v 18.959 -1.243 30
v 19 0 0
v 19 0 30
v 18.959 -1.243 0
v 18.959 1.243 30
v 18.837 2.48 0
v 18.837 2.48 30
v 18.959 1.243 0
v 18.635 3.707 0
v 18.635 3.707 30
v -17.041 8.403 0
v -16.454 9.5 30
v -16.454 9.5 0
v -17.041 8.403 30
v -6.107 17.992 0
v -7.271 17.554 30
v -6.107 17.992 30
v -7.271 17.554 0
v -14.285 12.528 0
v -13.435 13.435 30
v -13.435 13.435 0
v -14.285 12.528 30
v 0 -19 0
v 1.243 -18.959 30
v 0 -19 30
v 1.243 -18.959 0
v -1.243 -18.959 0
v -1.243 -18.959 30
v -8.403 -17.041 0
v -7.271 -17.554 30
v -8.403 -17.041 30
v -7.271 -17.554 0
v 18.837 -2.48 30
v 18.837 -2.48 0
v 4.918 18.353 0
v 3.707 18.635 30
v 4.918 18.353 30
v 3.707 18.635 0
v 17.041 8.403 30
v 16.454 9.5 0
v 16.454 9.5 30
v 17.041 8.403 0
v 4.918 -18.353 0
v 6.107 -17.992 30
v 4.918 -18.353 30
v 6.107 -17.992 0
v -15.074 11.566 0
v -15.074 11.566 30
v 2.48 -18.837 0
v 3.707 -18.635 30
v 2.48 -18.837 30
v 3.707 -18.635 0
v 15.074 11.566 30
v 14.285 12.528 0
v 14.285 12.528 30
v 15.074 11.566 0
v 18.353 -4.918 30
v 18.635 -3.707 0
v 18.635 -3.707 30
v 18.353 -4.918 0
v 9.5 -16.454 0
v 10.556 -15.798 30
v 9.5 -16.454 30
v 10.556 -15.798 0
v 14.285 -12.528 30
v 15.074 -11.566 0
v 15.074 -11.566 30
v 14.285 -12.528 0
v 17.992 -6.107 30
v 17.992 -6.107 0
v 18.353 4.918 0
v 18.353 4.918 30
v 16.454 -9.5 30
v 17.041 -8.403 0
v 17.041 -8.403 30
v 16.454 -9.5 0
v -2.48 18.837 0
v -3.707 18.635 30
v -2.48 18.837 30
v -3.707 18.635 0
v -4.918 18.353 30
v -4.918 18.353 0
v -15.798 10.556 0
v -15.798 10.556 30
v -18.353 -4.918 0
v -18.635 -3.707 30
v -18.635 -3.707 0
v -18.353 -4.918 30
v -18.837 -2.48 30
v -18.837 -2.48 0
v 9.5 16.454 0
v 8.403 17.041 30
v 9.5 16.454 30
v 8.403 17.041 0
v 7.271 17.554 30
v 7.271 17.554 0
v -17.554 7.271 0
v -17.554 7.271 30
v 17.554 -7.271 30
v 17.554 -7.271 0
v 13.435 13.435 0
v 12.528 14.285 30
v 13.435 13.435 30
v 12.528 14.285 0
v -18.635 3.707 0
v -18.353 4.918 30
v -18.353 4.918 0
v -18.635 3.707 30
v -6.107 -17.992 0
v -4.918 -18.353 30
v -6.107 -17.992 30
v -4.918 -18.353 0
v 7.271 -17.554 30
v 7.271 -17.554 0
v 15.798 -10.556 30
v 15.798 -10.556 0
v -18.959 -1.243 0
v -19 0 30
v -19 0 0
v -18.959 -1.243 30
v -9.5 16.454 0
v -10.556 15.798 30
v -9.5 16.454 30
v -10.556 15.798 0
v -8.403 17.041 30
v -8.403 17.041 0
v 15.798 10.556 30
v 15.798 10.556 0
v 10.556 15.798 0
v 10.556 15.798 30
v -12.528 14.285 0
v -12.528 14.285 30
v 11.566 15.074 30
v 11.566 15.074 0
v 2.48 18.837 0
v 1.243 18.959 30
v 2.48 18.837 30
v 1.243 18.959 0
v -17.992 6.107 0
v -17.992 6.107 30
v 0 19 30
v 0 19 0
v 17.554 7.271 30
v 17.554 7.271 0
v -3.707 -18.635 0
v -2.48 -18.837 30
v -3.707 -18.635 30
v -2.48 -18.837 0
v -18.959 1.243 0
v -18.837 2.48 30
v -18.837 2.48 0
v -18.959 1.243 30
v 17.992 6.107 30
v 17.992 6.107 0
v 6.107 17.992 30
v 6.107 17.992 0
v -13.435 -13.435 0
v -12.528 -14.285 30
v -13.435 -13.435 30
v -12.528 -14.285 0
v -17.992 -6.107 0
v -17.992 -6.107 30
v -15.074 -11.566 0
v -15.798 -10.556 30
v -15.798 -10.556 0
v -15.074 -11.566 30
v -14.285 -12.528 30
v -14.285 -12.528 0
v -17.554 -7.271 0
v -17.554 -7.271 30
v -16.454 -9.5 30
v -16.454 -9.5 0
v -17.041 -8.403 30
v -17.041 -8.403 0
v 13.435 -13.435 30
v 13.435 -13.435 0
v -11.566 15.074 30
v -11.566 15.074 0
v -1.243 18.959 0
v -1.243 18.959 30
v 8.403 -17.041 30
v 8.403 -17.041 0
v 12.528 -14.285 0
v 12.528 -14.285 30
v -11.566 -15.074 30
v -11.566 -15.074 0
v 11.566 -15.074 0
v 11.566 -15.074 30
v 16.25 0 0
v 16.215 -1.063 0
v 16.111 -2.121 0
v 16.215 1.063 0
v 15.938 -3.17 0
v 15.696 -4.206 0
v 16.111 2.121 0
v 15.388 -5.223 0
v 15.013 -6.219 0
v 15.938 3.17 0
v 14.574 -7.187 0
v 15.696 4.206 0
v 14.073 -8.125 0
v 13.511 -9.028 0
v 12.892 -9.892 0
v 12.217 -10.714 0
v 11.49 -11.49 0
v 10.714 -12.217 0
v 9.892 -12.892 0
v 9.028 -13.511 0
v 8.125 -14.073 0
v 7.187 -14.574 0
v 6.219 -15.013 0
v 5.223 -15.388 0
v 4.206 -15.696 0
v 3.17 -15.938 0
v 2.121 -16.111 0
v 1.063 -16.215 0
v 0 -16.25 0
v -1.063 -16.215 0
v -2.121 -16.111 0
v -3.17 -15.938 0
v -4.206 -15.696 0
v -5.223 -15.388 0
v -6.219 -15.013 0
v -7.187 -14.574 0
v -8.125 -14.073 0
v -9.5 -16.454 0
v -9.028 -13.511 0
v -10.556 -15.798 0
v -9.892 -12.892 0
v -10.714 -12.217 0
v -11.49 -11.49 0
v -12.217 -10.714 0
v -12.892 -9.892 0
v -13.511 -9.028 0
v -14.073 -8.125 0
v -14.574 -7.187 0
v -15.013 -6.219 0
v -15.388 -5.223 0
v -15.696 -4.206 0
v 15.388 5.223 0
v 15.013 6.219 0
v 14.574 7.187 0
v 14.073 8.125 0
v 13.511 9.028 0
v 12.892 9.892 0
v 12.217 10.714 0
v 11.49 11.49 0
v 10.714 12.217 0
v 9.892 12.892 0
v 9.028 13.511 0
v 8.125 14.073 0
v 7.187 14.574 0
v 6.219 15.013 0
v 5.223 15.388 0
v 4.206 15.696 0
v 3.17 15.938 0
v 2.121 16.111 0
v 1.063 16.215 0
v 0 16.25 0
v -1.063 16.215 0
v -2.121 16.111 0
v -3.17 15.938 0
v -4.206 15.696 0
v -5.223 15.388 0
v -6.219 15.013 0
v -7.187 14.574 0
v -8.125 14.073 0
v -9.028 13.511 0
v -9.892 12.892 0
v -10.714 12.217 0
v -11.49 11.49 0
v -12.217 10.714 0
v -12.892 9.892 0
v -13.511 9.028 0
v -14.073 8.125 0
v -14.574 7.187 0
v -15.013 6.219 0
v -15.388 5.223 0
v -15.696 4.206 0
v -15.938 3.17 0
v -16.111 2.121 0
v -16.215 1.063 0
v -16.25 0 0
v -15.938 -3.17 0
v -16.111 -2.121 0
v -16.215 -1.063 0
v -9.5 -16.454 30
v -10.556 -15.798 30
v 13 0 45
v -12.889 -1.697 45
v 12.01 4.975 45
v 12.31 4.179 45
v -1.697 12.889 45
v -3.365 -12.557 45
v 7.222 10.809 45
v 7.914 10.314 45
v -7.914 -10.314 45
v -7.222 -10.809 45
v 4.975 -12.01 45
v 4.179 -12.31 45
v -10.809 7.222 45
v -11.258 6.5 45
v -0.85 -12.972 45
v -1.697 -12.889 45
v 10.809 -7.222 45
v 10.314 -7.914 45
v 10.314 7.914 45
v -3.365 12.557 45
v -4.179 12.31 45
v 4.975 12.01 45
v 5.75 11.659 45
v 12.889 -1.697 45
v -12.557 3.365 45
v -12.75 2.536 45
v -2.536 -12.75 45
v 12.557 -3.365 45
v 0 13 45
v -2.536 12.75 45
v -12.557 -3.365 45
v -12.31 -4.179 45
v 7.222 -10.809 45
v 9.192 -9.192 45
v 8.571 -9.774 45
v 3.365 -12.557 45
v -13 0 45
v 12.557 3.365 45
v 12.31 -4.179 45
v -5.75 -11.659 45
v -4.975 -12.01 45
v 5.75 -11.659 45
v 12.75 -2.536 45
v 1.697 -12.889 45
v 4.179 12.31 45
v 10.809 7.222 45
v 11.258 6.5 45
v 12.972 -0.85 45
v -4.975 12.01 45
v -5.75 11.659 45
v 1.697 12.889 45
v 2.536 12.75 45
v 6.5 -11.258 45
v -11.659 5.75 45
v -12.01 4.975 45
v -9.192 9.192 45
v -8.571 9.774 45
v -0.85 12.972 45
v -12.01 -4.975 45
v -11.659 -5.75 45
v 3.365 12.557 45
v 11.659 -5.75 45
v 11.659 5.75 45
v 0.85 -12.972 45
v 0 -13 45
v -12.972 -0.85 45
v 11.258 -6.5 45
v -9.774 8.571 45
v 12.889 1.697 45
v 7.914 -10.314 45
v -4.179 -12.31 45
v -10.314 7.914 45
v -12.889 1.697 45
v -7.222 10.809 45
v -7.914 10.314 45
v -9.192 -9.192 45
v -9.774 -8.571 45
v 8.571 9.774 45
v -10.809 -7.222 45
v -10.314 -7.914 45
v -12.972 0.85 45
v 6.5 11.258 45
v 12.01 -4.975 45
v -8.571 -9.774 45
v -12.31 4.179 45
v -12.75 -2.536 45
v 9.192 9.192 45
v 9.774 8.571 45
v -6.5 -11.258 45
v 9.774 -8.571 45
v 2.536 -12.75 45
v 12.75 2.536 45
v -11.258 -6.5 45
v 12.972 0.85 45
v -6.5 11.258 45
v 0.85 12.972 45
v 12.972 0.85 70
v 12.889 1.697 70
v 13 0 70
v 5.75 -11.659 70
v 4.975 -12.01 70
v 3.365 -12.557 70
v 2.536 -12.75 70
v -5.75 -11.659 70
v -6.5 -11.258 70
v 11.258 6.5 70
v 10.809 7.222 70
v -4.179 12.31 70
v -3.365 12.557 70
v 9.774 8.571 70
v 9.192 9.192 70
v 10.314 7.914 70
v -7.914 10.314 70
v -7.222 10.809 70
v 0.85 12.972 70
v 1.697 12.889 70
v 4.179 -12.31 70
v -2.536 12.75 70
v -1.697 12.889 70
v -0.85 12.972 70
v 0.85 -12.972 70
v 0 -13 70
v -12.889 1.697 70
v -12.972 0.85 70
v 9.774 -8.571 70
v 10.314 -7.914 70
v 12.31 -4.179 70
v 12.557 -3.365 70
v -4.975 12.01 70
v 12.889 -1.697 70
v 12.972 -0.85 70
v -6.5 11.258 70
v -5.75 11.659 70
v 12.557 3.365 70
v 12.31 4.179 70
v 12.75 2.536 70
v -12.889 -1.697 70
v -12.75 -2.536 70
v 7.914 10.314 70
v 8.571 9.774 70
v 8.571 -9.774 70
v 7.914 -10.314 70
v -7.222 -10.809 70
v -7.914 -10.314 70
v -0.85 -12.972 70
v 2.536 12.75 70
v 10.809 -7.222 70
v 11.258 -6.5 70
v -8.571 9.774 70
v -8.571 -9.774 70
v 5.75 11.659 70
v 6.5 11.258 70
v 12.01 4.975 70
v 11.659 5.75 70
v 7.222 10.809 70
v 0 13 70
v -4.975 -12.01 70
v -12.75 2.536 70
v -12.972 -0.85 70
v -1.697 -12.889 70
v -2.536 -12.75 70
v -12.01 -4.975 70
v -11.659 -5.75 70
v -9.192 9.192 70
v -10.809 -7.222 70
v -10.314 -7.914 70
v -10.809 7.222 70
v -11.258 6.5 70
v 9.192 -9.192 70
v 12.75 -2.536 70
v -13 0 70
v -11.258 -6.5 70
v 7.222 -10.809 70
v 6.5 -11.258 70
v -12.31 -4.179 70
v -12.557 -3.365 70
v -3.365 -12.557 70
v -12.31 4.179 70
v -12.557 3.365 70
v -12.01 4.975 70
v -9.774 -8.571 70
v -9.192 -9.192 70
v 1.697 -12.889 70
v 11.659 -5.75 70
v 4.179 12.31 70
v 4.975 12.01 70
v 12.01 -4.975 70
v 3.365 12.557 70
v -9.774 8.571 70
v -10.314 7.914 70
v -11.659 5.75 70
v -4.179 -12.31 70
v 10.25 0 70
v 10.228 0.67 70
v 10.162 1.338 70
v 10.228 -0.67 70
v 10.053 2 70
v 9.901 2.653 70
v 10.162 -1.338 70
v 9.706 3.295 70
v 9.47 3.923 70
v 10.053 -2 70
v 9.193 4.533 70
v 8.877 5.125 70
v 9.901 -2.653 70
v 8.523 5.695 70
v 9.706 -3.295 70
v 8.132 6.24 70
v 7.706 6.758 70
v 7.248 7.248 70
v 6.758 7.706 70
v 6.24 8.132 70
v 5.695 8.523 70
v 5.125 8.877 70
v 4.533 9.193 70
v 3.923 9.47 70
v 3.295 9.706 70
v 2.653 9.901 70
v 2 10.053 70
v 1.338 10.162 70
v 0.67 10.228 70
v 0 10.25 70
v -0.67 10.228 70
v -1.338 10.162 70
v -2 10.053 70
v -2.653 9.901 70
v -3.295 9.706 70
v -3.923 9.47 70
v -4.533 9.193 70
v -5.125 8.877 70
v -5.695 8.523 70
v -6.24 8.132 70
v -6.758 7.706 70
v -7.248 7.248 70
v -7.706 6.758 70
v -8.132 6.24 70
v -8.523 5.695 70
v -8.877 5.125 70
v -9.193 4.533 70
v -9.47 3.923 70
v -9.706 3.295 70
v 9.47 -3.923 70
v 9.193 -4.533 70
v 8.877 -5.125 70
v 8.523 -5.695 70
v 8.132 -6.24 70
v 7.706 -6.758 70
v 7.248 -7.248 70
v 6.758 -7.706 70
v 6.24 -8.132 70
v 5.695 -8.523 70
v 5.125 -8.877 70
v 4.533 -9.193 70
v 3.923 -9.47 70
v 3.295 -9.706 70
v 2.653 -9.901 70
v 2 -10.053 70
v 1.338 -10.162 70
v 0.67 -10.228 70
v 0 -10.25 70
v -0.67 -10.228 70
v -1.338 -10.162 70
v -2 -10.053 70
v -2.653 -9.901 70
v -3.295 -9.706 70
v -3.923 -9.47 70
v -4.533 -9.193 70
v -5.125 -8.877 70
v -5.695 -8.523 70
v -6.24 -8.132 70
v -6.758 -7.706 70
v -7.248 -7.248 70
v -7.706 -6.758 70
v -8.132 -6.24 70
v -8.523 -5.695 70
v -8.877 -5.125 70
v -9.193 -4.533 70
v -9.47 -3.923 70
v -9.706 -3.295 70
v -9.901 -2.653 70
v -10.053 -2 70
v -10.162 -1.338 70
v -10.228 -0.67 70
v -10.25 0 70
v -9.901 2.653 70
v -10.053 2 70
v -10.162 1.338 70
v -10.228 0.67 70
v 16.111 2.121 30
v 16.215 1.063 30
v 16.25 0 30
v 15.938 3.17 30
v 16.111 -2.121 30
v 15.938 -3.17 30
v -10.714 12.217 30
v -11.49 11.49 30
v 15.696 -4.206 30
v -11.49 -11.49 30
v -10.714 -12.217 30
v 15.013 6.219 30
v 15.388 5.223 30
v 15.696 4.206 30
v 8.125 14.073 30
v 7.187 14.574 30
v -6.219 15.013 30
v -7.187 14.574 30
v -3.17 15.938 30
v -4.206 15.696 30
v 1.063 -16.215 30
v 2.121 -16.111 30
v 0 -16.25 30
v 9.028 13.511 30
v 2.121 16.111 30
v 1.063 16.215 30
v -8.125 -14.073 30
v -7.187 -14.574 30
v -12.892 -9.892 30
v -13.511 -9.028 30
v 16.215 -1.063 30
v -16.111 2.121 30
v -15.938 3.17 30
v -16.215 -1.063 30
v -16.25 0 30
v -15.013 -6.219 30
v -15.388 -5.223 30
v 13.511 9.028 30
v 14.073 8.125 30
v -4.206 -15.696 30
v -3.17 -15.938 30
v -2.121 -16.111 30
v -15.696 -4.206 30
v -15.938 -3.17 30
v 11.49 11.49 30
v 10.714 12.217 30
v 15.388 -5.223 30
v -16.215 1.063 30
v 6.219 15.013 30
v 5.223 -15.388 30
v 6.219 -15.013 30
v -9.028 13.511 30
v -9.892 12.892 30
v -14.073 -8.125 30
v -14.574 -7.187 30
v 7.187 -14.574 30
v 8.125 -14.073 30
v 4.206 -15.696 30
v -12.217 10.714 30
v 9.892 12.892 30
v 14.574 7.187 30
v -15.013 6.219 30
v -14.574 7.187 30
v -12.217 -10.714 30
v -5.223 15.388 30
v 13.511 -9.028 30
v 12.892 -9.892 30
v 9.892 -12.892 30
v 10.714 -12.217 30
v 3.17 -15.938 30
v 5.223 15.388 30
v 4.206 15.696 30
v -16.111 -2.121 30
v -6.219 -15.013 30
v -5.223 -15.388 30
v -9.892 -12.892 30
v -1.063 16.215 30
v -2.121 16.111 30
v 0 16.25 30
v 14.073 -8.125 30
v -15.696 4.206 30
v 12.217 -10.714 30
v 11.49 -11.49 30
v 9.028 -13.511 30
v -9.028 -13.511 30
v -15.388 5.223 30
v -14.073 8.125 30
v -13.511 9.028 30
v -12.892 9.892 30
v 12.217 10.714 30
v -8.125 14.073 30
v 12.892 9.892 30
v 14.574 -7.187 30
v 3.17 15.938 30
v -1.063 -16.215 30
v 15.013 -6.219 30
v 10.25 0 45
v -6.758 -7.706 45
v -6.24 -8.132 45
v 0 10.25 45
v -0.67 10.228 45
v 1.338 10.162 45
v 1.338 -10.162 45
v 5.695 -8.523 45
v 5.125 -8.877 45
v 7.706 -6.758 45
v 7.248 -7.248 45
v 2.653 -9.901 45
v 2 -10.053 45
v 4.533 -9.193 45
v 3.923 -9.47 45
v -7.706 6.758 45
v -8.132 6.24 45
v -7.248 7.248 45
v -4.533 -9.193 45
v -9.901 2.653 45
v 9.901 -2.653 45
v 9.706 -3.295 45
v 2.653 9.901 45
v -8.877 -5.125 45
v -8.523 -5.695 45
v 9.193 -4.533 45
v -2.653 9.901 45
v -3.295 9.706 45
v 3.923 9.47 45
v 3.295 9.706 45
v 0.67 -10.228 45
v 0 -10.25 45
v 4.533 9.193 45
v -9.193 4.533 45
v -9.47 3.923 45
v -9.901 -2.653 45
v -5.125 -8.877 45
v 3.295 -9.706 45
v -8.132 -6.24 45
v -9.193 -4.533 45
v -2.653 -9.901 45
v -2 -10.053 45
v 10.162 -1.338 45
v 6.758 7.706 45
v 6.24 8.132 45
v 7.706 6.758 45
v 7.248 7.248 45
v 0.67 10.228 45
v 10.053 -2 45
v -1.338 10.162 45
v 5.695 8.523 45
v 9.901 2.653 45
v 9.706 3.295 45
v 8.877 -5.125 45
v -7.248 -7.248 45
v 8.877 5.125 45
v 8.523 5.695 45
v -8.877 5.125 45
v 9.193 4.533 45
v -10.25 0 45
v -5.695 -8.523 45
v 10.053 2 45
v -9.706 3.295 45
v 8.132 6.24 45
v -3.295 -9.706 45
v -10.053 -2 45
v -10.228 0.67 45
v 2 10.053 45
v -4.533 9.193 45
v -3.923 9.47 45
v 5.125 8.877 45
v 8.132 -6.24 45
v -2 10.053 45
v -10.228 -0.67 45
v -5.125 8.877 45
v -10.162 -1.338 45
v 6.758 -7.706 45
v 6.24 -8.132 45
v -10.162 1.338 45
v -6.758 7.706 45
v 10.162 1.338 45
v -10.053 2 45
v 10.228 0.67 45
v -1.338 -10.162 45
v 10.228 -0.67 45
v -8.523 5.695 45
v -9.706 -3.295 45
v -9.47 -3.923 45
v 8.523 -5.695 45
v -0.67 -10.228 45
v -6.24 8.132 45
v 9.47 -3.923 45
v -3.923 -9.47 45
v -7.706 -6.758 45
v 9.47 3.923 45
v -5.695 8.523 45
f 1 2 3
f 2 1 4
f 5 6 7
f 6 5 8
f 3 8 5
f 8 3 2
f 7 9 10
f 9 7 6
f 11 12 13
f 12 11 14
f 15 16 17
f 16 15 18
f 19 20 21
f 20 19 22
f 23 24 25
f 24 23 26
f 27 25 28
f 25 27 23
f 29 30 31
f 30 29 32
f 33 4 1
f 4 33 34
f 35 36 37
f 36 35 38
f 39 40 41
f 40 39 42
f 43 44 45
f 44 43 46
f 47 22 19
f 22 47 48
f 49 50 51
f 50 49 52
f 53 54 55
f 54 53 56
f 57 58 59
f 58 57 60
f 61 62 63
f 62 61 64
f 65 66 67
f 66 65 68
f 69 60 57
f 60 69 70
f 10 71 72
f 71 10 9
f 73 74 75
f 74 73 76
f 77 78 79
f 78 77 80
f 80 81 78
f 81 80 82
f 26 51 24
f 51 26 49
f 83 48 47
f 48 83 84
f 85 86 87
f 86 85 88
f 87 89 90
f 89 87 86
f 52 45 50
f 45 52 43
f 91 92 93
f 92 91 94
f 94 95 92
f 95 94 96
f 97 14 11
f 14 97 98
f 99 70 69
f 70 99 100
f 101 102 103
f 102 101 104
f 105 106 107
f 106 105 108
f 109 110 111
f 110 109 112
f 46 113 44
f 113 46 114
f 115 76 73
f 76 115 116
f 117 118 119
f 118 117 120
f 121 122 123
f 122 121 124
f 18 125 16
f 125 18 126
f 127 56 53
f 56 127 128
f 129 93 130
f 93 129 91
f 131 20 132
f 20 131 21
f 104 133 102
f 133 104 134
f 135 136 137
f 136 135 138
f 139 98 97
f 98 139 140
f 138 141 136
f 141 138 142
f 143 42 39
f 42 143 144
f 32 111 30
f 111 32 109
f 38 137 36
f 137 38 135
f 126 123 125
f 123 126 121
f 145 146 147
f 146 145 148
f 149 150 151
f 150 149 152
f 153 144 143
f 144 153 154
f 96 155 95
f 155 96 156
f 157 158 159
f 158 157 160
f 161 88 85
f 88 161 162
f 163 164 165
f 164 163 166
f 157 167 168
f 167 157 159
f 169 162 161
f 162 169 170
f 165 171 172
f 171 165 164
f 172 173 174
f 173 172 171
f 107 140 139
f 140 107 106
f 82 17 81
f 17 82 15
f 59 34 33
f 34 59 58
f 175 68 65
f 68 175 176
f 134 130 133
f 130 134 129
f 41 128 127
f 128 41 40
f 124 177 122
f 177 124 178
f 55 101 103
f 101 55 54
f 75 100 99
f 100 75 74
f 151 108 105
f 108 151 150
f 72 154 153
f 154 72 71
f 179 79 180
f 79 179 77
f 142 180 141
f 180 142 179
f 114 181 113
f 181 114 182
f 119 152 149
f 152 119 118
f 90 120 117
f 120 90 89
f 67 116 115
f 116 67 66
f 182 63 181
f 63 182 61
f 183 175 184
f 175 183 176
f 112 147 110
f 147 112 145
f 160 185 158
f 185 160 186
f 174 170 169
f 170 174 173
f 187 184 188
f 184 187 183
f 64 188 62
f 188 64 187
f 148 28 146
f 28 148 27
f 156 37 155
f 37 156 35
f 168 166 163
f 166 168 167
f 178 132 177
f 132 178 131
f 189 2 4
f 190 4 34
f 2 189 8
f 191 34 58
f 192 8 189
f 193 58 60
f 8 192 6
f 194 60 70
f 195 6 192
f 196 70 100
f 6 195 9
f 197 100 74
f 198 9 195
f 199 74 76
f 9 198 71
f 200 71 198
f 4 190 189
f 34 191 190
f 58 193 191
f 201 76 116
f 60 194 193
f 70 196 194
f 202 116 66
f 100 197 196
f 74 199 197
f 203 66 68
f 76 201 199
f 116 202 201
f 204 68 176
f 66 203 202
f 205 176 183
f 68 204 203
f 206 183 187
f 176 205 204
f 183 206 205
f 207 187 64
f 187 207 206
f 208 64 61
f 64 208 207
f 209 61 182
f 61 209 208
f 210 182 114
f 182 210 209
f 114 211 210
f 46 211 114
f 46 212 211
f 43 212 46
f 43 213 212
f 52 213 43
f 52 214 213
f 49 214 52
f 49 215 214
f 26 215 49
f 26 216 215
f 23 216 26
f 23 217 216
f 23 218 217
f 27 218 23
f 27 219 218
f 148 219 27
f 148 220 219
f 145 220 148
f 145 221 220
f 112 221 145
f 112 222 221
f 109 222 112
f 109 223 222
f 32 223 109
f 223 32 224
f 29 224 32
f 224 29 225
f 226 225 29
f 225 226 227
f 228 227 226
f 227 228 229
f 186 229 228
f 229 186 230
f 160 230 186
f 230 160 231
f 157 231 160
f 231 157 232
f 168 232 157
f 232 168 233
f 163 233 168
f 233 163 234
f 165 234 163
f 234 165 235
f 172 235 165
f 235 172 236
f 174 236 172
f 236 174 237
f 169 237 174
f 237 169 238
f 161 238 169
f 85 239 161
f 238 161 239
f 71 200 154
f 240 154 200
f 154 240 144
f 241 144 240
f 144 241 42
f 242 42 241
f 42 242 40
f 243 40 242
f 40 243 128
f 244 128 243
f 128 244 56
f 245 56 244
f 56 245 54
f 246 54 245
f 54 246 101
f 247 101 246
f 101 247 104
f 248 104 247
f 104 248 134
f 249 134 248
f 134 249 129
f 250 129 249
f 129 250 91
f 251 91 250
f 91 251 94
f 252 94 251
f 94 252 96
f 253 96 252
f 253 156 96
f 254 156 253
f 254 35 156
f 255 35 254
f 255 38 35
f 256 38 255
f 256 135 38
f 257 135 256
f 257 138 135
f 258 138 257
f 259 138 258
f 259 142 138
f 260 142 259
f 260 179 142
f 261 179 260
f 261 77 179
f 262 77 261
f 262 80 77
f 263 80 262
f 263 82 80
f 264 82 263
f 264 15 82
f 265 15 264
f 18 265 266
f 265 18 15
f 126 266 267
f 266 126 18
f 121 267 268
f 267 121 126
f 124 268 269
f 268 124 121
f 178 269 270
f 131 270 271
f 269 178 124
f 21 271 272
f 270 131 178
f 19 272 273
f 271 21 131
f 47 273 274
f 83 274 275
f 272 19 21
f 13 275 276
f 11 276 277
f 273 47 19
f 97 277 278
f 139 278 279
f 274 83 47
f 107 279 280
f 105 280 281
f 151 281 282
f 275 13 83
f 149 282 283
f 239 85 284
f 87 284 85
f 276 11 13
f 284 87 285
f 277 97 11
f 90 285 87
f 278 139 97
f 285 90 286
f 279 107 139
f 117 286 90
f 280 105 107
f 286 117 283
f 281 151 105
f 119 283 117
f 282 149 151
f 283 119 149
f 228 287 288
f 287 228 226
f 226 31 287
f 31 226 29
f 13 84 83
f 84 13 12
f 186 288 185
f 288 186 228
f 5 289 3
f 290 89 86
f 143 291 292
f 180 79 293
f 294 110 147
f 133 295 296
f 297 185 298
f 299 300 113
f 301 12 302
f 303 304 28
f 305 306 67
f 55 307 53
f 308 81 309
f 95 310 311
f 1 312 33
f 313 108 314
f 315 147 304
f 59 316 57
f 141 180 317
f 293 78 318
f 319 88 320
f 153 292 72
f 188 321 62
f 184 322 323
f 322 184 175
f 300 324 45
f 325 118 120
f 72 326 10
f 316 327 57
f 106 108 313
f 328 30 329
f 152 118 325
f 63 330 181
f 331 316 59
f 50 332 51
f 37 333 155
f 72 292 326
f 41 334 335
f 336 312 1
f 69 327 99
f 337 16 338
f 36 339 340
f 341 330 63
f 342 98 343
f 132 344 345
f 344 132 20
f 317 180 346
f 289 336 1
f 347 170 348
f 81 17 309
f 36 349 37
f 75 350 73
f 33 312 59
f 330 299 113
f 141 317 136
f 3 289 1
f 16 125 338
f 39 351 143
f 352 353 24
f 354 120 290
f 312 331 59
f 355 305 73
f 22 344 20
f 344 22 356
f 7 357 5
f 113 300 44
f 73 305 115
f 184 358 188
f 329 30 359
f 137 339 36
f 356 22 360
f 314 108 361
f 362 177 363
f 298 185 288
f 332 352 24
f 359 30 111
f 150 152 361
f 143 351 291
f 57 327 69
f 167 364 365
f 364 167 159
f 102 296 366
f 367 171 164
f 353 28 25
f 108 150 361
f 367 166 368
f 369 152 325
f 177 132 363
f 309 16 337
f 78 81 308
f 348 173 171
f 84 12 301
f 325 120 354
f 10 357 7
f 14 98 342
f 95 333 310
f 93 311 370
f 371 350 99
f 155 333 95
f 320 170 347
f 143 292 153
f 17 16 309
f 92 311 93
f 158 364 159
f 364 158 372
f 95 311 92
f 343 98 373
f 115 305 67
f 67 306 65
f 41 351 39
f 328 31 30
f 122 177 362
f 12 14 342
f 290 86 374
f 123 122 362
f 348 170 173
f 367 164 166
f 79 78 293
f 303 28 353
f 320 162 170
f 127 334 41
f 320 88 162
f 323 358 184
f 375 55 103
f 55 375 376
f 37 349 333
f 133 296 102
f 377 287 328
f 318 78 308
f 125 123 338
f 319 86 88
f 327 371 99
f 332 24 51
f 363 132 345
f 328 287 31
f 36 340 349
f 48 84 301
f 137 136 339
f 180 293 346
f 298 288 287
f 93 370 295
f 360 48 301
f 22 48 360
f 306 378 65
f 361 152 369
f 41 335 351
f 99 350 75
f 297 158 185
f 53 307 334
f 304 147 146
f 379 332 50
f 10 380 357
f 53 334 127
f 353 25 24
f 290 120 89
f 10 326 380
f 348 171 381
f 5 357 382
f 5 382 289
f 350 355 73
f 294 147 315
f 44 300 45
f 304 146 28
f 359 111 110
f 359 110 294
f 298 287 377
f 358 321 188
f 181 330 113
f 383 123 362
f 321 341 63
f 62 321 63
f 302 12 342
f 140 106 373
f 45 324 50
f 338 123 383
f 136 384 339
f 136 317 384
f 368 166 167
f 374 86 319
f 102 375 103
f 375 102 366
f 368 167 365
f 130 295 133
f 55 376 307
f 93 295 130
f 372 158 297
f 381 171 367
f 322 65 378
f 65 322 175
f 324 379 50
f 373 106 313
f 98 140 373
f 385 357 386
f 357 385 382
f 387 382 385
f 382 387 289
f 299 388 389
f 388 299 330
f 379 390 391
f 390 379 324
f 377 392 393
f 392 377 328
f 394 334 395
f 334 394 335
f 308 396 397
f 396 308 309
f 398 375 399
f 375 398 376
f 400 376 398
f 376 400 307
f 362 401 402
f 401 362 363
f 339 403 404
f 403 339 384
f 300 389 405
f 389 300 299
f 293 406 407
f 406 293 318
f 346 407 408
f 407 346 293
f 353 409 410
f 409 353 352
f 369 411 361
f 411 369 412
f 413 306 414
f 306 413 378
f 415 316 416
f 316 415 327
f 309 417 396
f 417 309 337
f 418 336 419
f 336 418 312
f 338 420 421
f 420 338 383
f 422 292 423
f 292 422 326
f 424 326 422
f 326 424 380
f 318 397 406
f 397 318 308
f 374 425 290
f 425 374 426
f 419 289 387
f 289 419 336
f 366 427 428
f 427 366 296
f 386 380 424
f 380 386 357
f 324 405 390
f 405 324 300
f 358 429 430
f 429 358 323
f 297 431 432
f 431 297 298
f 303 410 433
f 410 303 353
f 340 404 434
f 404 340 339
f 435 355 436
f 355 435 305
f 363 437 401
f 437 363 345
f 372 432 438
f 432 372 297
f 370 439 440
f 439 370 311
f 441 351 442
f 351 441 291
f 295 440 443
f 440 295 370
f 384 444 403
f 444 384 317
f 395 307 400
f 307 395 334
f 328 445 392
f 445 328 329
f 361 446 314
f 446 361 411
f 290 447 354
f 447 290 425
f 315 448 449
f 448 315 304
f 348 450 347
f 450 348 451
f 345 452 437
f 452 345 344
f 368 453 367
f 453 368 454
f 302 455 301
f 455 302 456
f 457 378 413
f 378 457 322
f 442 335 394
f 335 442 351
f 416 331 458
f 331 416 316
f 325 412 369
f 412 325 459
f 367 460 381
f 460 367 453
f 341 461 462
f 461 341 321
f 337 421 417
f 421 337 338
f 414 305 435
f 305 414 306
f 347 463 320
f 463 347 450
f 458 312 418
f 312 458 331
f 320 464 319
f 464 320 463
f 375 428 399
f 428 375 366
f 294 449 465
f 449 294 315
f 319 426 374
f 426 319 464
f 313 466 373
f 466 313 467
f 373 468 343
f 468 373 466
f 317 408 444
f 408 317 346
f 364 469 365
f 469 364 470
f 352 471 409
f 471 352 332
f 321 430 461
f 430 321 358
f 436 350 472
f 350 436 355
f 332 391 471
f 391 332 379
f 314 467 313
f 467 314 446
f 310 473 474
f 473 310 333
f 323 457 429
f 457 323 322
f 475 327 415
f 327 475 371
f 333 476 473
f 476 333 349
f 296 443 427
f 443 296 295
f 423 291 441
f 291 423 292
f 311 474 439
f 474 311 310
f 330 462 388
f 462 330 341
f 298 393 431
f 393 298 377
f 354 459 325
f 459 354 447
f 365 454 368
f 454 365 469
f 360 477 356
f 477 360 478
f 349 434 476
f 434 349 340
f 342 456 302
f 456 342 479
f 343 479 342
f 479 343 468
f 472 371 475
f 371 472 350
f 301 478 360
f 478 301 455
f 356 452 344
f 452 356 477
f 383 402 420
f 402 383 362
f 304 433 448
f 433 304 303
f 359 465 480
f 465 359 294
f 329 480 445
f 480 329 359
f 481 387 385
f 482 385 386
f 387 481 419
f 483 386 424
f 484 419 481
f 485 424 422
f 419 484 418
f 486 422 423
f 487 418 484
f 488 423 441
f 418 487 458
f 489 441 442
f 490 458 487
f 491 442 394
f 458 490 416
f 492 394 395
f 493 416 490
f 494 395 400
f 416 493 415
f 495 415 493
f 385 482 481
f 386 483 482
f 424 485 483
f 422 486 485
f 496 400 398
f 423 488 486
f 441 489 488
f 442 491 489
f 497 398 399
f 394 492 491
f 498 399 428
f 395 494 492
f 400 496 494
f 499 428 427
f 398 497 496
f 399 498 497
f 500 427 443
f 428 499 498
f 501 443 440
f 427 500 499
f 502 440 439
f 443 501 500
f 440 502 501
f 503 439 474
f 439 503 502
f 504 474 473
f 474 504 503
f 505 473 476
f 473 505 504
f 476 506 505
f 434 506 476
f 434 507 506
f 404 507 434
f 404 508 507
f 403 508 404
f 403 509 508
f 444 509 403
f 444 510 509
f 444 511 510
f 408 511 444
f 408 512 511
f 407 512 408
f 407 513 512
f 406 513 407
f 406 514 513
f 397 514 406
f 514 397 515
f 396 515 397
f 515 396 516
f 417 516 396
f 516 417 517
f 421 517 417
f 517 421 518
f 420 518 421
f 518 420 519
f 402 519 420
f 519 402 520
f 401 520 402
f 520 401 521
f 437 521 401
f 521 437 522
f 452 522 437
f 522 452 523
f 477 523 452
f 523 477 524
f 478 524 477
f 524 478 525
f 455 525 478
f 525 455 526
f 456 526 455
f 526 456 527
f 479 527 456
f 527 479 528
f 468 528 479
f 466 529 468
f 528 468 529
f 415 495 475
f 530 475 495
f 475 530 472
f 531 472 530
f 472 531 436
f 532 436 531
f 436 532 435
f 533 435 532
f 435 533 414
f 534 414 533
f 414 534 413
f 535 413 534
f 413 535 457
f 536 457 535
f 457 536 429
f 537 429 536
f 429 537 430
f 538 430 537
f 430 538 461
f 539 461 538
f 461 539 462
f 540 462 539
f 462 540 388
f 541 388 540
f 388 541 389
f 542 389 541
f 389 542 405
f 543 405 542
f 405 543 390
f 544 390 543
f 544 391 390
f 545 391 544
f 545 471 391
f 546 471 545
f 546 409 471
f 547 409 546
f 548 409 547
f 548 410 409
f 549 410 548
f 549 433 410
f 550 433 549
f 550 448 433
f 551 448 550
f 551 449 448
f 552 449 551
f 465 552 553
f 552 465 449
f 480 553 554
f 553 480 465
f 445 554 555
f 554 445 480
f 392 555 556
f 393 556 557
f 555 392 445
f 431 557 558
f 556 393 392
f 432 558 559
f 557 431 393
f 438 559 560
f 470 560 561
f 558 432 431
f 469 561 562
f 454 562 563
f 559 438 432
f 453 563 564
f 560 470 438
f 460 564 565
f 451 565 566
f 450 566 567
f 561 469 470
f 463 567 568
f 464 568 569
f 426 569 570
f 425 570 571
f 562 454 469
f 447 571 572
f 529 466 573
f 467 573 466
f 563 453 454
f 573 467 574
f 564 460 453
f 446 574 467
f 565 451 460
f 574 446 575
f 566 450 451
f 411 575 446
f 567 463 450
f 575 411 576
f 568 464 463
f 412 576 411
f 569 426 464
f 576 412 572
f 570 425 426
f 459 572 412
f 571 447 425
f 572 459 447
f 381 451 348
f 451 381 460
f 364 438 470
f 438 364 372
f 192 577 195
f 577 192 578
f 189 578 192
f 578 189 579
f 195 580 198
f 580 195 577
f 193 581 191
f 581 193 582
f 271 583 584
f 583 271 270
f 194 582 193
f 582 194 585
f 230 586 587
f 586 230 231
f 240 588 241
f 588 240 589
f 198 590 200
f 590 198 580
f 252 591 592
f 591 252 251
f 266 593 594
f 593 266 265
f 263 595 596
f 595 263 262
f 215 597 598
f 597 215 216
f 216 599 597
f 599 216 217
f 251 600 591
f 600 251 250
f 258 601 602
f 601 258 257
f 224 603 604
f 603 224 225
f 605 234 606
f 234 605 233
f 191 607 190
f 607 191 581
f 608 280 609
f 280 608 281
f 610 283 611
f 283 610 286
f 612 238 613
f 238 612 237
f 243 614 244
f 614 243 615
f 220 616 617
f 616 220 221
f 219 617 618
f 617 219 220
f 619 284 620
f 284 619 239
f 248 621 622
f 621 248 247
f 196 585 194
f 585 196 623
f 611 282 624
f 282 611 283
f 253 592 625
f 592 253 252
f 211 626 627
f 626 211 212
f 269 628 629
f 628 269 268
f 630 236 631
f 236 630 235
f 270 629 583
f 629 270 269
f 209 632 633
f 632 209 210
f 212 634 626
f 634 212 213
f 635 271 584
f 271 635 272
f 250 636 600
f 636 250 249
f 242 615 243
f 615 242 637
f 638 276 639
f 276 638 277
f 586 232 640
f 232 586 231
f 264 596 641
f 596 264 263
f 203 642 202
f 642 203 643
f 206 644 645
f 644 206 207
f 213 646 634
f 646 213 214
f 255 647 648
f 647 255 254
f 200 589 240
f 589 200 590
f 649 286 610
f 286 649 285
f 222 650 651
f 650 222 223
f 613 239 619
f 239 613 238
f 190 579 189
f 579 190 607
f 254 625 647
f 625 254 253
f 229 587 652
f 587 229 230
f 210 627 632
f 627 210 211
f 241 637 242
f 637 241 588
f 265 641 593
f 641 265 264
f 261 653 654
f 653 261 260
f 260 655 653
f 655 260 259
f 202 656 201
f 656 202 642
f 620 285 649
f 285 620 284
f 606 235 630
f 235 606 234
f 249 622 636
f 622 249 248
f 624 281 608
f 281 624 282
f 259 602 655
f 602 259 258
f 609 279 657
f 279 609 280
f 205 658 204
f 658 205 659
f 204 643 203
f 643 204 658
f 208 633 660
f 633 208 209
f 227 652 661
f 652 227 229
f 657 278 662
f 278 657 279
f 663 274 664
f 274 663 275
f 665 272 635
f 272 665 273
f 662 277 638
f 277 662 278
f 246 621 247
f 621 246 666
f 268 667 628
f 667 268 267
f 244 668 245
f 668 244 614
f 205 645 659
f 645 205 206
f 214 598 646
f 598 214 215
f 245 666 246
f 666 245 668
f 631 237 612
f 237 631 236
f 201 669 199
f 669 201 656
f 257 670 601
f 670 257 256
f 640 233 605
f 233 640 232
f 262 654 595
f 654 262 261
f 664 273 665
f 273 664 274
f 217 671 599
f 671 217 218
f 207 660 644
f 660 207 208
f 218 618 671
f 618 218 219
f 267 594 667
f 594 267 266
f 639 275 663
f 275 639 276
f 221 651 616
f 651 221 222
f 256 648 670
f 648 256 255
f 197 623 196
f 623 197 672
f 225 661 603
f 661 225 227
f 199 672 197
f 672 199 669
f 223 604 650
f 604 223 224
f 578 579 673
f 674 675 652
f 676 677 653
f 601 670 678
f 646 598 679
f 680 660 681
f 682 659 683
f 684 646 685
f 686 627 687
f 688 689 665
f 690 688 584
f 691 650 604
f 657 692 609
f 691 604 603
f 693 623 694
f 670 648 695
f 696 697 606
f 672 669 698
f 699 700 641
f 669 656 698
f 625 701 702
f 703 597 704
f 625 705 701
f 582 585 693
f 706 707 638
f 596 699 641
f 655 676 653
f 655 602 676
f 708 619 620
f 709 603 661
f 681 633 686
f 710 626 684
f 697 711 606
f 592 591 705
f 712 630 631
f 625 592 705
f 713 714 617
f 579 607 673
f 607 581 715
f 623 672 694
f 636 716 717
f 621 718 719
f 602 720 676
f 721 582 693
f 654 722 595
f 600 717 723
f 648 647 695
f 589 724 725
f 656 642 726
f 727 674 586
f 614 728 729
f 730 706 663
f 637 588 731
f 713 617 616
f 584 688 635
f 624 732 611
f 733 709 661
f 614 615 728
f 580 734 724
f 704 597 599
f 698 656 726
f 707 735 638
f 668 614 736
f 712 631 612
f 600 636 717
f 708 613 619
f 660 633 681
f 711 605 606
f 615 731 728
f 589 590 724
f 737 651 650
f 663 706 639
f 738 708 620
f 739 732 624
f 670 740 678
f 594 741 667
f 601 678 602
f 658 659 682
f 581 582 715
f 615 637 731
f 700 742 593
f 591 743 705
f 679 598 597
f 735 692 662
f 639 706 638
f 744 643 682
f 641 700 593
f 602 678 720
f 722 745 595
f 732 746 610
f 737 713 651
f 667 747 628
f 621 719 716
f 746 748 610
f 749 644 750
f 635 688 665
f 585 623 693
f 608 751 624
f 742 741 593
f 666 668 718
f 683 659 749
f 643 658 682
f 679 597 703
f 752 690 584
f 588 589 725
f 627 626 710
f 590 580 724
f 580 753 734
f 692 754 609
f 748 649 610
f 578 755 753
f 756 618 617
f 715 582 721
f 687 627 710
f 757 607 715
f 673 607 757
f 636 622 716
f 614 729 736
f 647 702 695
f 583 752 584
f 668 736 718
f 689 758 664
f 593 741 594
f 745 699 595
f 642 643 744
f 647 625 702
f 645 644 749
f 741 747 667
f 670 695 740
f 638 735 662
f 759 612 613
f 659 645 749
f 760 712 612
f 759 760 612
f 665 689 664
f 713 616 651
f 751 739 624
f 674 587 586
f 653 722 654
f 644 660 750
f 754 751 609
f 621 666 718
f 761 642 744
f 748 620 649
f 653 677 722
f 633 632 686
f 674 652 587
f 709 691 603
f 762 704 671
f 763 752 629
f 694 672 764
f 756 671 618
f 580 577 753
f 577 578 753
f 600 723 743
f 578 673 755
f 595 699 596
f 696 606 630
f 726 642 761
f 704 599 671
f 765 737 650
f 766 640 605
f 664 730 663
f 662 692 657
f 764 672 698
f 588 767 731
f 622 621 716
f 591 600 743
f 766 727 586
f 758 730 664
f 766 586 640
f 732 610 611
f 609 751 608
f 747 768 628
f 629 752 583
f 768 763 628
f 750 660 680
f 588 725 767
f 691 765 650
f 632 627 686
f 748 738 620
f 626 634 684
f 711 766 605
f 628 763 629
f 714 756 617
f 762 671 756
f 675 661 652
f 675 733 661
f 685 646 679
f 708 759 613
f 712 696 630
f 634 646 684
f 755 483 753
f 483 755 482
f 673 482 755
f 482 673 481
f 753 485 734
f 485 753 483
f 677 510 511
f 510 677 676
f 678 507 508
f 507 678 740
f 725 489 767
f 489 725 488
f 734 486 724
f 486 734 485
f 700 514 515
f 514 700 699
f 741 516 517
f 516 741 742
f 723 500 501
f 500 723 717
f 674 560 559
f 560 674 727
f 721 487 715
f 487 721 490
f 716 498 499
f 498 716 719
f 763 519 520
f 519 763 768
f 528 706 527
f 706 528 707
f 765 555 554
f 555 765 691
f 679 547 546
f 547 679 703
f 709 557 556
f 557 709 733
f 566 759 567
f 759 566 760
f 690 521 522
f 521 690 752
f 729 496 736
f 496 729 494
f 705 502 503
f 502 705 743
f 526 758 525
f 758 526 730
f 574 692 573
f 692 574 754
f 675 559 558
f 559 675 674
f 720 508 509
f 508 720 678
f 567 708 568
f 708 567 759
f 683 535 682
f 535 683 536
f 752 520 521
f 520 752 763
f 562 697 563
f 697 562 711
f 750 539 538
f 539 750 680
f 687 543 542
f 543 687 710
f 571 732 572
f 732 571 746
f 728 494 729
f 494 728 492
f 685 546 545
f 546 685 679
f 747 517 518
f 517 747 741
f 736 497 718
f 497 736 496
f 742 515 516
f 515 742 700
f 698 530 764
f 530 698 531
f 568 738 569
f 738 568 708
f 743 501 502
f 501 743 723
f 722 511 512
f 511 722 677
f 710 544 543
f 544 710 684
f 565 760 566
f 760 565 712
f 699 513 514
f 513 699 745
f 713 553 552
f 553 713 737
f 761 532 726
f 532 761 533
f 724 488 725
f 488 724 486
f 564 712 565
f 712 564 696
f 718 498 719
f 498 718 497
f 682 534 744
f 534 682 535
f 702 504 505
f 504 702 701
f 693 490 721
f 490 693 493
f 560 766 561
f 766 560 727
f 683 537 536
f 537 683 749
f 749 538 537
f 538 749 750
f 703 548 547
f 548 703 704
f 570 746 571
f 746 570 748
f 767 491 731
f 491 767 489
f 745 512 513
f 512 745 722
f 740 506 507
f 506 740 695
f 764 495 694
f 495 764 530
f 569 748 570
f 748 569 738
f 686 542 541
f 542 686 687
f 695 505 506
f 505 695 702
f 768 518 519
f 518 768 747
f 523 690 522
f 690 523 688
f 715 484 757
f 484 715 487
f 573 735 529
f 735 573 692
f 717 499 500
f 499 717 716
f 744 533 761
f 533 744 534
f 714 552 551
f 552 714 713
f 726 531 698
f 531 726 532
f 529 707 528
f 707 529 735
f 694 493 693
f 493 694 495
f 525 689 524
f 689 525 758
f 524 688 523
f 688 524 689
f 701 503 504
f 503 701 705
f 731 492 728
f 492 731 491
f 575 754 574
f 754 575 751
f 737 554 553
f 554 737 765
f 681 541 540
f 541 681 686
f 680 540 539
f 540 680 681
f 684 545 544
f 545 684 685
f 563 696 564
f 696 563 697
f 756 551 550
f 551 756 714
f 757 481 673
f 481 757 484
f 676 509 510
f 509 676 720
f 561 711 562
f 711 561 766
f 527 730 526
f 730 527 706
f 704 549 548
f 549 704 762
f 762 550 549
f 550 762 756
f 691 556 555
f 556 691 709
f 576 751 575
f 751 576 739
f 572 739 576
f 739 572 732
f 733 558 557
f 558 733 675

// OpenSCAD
// Reference solution for `pipe_adapter`: checks the grader, never shown to agents.
$fn = 96;
module adapter() difference() {
    union() {
        cylinder(d = 38, h = 30);
        translate([0, 0, 30]) cylinder(d1 = 38, d2 = 26, h = 15);
        translate([0, 0, 45]) cylinder(d = 26, h = 25);
    }
    translate([0, 0, -1]) cylinder(d = 32.5, h = 31);
    translate([0, 0, 30]) cylinder(d1 = 32.5, d2 = 20.5, h = 15);
    translate([0, 0, 44.99]) cylinder(d = 20.5, h = 26);
}
adapter();
